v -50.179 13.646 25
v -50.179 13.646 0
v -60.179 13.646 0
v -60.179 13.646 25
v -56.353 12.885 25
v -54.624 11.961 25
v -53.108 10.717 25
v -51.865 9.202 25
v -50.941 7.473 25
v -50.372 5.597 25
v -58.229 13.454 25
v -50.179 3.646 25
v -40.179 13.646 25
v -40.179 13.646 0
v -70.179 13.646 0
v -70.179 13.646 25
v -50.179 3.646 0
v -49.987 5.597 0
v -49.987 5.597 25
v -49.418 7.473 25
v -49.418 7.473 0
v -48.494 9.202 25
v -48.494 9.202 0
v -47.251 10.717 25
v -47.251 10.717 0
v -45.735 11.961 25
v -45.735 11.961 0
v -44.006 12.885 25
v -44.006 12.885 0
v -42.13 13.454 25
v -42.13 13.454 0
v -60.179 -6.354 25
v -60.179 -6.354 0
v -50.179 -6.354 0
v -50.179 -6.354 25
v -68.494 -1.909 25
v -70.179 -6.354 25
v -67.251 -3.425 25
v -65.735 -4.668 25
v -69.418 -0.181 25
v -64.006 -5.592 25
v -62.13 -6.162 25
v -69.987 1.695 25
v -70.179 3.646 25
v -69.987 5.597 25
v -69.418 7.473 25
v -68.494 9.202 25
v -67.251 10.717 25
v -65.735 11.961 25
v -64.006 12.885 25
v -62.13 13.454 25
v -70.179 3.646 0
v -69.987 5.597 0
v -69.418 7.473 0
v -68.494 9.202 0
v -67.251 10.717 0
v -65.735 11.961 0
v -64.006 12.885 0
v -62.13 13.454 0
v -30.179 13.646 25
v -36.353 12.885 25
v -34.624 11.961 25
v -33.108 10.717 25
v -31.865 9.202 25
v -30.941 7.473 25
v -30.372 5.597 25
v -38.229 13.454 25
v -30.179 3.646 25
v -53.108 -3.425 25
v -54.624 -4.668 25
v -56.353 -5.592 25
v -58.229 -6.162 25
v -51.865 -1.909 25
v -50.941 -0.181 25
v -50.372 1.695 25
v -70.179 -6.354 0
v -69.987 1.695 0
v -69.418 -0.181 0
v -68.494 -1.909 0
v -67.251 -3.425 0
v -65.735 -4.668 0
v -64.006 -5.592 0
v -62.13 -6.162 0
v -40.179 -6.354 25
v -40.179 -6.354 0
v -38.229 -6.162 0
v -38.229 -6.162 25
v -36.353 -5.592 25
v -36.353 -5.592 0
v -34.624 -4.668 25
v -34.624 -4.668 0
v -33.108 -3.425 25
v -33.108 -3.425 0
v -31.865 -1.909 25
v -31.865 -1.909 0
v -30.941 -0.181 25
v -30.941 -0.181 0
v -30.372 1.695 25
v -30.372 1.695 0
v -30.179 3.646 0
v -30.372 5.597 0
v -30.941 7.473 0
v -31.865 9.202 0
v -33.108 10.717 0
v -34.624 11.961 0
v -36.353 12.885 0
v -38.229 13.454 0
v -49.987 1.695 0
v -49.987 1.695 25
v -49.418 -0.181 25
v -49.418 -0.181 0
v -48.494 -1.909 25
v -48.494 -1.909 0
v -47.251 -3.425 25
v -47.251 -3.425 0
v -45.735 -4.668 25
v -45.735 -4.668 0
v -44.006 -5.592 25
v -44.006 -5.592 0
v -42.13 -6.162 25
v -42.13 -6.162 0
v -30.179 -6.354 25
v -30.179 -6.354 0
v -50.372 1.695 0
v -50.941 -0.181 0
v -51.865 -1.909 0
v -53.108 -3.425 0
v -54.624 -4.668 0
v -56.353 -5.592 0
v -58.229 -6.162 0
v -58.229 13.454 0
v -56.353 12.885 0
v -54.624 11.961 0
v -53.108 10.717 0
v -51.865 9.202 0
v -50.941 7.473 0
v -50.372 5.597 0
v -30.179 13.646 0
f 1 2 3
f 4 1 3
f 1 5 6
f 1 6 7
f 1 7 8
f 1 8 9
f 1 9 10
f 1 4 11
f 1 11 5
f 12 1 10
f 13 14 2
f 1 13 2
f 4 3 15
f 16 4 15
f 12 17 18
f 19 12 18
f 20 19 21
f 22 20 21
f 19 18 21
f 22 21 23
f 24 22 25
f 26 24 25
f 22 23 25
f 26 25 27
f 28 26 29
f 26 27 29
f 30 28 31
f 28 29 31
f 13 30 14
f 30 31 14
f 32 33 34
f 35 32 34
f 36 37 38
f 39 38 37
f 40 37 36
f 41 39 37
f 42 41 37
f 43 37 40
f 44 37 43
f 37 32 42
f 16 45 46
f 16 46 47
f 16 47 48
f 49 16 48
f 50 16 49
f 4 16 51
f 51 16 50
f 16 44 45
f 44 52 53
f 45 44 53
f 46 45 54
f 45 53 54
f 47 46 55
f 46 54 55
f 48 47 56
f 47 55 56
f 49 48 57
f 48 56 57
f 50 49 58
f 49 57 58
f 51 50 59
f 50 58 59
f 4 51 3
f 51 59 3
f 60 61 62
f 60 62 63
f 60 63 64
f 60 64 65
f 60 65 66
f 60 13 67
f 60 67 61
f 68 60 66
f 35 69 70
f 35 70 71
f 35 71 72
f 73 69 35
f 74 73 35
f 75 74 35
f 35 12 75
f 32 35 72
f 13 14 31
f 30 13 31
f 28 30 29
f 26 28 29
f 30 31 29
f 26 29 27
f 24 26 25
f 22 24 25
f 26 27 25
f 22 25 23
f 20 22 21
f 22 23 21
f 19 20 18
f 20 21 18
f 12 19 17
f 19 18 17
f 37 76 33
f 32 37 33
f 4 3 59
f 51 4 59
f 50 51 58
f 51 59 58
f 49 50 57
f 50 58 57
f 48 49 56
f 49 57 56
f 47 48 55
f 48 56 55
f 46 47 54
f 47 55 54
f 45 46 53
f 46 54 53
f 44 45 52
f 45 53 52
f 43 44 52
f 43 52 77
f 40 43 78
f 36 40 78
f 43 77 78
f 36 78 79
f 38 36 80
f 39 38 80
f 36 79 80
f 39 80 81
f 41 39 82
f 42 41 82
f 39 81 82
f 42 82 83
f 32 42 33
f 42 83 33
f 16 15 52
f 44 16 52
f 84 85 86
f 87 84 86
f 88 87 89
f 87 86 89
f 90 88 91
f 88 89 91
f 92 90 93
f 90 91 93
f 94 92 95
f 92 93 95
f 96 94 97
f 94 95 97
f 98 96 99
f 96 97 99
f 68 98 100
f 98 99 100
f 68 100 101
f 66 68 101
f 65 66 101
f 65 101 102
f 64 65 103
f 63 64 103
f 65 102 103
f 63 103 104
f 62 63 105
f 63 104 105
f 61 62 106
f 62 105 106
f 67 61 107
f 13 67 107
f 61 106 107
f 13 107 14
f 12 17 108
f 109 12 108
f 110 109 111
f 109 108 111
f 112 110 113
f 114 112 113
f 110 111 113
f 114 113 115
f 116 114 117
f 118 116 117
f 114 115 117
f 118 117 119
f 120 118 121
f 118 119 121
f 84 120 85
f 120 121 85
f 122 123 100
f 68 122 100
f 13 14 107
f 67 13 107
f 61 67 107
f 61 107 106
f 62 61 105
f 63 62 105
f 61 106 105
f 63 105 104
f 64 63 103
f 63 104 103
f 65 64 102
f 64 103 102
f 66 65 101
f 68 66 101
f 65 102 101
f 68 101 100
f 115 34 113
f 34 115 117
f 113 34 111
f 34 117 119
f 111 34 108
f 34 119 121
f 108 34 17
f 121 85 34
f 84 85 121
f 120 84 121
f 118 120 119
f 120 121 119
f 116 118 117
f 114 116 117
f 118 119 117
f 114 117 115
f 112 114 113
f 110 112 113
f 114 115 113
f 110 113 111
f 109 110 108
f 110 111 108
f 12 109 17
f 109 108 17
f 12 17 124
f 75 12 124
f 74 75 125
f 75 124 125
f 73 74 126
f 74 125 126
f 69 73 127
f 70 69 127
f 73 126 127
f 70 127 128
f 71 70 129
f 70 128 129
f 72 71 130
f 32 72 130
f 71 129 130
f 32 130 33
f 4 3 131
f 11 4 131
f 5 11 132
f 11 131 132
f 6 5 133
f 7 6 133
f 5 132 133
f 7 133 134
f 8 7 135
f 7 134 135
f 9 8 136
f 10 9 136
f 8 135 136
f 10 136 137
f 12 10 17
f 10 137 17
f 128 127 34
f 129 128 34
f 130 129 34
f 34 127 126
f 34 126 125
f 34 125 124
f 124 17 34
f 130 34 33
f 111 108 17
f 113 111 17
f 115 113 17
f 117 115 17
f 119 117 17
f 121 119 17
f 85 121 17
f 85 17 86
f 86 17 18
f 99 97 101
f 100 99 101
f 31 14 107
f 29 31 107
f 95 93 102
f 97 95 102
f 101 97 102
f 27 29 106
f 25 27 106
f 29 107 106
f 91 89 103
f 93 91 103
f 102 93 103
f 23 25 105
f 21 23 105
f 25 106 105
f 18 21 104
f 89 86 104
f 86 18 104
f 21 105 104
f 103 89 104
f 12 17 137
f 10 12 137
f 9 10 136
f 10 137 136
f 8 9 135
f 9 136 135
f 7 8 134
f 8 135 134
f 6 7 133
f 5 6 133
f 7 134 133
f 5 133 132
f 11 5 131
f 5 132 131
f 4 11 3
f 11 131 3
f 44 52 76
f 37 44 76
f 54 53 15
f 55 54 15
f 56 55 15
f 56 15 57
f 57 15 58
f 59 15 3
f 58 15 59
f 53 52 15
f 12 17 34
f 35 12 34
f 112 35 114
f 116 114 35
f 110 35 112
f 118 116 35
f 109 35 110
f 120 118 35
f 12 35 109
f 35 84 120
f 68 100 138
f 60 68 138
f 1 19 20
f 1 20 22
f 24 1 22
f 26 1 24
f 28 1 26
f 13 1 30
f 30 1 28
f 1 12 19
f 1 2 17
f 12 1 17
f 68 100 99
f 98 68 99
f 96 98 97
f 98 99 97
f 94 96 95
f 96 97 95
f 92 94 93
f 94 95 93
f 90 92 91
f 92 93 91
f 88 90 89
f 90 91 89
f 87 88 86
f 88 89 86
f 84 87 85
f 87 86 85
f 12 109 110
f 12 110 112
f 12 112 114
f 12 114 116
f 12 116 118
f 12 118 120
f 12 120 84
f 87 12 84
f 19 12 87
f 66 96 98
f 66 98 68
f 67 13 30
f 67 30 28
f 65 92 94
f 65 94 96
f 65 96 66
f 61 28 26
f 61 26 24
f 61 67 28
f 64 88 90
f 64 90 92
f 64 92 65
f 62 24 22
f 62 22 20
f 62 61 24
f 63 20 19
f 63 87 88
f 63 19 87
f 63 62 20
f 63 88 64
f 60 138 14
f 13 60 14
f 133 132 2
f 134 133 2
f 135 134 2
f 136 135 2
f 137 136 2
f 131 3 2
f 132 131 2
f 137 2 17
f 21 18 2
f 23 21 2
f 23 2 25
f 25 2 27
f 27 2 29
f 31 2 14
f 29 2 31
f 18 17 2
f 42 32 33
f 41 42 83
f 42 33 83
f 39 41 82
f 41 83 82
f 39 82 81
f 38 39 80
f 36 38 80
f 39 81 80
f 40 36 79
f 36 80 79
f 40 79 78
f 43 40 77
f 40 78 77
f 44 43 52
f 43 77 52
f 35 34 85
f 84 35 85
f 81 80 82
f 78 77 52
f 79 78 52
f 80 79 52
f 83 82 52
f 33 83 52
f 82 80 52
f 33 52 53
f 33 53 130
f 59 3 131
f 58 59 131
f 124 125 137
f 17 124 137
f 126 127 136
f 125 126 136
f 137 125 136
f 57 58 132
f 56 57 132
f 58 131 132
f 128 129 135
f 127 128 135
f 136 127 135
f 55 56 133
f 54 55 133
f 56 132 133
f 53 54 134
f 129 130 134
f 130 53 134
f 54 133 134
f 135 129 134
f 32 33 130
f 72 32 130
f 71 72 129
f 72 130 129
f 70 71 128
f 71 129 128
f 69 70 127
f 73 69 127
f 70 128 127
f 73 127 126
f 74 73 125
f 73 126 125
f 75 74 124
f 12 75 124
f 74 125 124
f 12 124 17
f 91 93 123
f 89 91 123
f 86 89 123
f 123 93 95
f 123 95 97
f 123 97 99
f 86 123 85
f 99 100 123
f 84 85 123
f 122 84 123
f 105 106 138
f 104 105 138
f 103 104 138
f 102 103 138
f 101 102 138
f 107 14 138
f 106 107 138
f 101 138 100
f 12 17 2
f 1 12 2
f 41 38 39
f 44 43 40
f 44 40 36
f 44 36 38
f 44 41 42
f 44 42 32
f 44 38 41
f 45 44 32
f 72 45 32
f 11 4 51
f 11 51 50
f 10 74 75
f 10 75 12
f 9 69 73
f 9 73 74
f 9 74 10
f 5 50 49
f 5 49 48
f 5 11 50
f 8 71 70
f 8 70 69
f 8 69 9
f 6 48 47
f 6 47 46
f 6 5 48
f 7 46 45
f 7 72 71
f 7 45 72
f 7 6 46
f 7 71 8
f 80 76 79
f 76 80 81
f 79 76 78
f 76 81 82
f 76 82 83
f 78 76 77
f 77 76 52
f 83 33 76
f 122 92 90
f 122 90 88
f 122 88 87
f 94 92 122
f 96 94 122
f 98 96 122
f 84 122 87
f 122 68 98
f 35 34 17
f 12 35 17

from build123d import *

# Parameters (mm, degrees)
F1_DEPTH = 25
F2_DEPTH = 25
F3_DEPTH = 25


with BuildPart() as f1:
    # F0 (on Top) → F1 (new body)
    with BuildSketch(Plane.XY):
        with BuildLine():
            Line((-60.1794990897, 13.6463295169), (-70.1794990897, 13.6463295169))
            Line((-70.1794990897, 13.6463295169), (-70.1794990897, 3.6463295169))
            ThreePointArc((-70.1794990897, 3.6463295169), (-67.2505669016, 10.7173973287), (-60.1794990897, 13.6463295169))
        make_face()
    extrude(amount=F1_DEPTH)


with BuildPart() as f1b:
    # F0 (on Top) → F1, piece 2 (new body)
    with BuildSketch(Plane.XY):
        with BuildLine():
            Line((-50.1794990897, -6.3536704831), (-50.1794990897, 3.6463295169))
            ThreePointArc((-50.1794990897, 3.6463295169), (-53.1084312779, -3.424738295), (-60.1794990897, -6.3536704831))
            Line((-60.1794990897, -6.3536704831), (-50.1794990897, -6.3536704831))
        make_face()
    extrude(amount=F1_DEPTH)


with BuildPart() as f1c:
    # F0 (on Top) → F1, piece 3 (new body)
    with BuildSketch(Plane.XY):
        with BuildLine():
            Line((-40.1794990897, 13.6463295169), (-50.1794990897, 13.6463295169))
            Line((-50.1794990897, 13.6463295169), (-50.1794990897, 3.6463295169))
            ThreePointArc((-50.1794990897, 3.6463295169), (-47.2505669016, 10.7173973287), (-40.1794990897, 13.6463295169))
        make_face()
    extrude(amount=F1_DEPTH)


with BuildPart() as f1d:
    # F0 (on Top) → F1, piece 4 (new body)
    with BuildSketch(Plane.XY):
        with BuildLine():
            ThreePointArc((-30.1794990897, 3.6463295169), (-33.1084312779, -3.424738295), (-40.1794990897, -6.3536704831))
            Line((-40.1794990897, -6.3536704831), (-30.1794990897, -6.3536704831))
            Line((-30.1794990897, -6.3536704831), (-30.1794990897, 3.6463295169))
        make_face()
    extrude(amount=F1_DEPTH)


with BuildPart() as f2:
    # F0 (on Top) → F2 (new body)
    with BuildSketch(Plane.XY):
        with BuildLine():
            ThreePointArc((-60.1794990897, -6.3536704831), (-67.2505669016, -3.424738295), (-70.1794990897, 3.6463295169))
            Line((-70.1794990897, 3.6463295169), (-70.1794990897, -6.3536704831))
            Line((-70.1794990897, -6.3536704831), (-60.1794990897, -6.3536704831))
        make_face()
    extrude(amount=F2_DEPTH)


with BuildPart() as f2b:
    # F0 (on Top) → F2, piece 2 (new body)
    with BuildSketch(Plane.XY):
        with BuildLine():
            Line((-50.1794990897, 13.6463295169), (-60.1794990897, 13.6463295169))
            ThreePointArc((-60.1794990897, 13.6463295169), (-53.1084312779, 10.7173973287), (-50.1794990897, 3.6463295169))
            Line((-50.1794990897, 3.6463295169), (-50.1794990897, 13.6463295169))
        make_face()
    extrude(amount=F2_DEPTH)


with BuildPart() as f2c:
    # F0 (on Top) → F2, piece 3 (new body)
    with BuildSketch(Plane.XY):
        with BuildLine():
            ThreePointArc((-40.1794990897, -6.3536704831), (-47.2505669016, -3.424738295), (-50.1794990897, 3.6463295169))
            Line((-50.1794990897, 3.6463295169), (-50.1794990897, -6.3536704831))
            Line((-50.1794990897, -6.3536704831), (-40.1794990897, -6.3536704831))
        make_face()
    extrude(amount=F2_DEPTH)


with BuildPart() as f2d:
    # F0 (on Top) → F2, piece 4 (new body)
    with BuildSketch(Plane.XY):
        with BuildLine():
            Line((-30.1794990897, 13.6463295169), (-40.1794990897, 13.6463295169))
            ThreePointArc((-40.1794990897, 13.6463295169), (-33.1084312779, 10.7173973287), (-30.1794990897, 3.6463295169))
            Line((-30.1794990897, 3.6463295169), (-30.1794990897, 13.6463295169))
        make_face()
    extrude(amount=F2_DEPTH)


with BuildPart() as f3:
    # F0 (on Top) → F3 (new body)
    with BuildSketch(Plane.XY):
        with BuildLine():
            ThreePointArc((-50.1794990897, 3.6463295169), (-53.1084312779, 10.7173973287), (-60.1794990897, 13.6463295169))
            ThreePointArc((-60.1794990897, 13.6463295169), (-67.2505669016, 10.7173973287), (-70.1794990897, 3.6463295169))
            ThreePointArc((-70.1794990897, 3.6463295169), (-67.2505669016, -3.424738295), (-60.1794990897, -6.3536704831))
            ThreePointArc((-60.1794990897, -6.3536704831), (-53.1084312779, -3.424738295), (-50.1794990897, 3.6463295169))
        make_face()
    extrude(amount=F3_DEPTH)


with BuildPart() as f3b:
    # F0 (on Top) → F3, piece 2 (new body)
    with BuildSketch(Plane.XY):
        with BuildLine():
            ThreePointArc((-40.1794990897, 13.6463295169), (-47.2505669016, 10.7173973287), (-50.1794990897, 3.6463295169))
            ThreePointArc((-50.1794990897, 3.6463295169), (-47.2505669016, -3.424738295), (-40.1794990897, -6.3536704831))
            ThreePointArc((-40.1794990897, -6.3536704831), (-33.1084312779, -3.424738295), (-30.1794990897, 3.6463295169))
            ThreePointArc((-30.1794990897, 3.6463295169), (-33.1084312779, 10.7173973287), (-40.1794990897, 13.6463295169))
        make_face()
    extrude(amount=F3_DEPTH)


solid = Compound([f1.part, f1b.part, f1c.part, f1d.part, f2.part, f2b.part, f2c.part, f2d.part, f3.part, f3b.part])
